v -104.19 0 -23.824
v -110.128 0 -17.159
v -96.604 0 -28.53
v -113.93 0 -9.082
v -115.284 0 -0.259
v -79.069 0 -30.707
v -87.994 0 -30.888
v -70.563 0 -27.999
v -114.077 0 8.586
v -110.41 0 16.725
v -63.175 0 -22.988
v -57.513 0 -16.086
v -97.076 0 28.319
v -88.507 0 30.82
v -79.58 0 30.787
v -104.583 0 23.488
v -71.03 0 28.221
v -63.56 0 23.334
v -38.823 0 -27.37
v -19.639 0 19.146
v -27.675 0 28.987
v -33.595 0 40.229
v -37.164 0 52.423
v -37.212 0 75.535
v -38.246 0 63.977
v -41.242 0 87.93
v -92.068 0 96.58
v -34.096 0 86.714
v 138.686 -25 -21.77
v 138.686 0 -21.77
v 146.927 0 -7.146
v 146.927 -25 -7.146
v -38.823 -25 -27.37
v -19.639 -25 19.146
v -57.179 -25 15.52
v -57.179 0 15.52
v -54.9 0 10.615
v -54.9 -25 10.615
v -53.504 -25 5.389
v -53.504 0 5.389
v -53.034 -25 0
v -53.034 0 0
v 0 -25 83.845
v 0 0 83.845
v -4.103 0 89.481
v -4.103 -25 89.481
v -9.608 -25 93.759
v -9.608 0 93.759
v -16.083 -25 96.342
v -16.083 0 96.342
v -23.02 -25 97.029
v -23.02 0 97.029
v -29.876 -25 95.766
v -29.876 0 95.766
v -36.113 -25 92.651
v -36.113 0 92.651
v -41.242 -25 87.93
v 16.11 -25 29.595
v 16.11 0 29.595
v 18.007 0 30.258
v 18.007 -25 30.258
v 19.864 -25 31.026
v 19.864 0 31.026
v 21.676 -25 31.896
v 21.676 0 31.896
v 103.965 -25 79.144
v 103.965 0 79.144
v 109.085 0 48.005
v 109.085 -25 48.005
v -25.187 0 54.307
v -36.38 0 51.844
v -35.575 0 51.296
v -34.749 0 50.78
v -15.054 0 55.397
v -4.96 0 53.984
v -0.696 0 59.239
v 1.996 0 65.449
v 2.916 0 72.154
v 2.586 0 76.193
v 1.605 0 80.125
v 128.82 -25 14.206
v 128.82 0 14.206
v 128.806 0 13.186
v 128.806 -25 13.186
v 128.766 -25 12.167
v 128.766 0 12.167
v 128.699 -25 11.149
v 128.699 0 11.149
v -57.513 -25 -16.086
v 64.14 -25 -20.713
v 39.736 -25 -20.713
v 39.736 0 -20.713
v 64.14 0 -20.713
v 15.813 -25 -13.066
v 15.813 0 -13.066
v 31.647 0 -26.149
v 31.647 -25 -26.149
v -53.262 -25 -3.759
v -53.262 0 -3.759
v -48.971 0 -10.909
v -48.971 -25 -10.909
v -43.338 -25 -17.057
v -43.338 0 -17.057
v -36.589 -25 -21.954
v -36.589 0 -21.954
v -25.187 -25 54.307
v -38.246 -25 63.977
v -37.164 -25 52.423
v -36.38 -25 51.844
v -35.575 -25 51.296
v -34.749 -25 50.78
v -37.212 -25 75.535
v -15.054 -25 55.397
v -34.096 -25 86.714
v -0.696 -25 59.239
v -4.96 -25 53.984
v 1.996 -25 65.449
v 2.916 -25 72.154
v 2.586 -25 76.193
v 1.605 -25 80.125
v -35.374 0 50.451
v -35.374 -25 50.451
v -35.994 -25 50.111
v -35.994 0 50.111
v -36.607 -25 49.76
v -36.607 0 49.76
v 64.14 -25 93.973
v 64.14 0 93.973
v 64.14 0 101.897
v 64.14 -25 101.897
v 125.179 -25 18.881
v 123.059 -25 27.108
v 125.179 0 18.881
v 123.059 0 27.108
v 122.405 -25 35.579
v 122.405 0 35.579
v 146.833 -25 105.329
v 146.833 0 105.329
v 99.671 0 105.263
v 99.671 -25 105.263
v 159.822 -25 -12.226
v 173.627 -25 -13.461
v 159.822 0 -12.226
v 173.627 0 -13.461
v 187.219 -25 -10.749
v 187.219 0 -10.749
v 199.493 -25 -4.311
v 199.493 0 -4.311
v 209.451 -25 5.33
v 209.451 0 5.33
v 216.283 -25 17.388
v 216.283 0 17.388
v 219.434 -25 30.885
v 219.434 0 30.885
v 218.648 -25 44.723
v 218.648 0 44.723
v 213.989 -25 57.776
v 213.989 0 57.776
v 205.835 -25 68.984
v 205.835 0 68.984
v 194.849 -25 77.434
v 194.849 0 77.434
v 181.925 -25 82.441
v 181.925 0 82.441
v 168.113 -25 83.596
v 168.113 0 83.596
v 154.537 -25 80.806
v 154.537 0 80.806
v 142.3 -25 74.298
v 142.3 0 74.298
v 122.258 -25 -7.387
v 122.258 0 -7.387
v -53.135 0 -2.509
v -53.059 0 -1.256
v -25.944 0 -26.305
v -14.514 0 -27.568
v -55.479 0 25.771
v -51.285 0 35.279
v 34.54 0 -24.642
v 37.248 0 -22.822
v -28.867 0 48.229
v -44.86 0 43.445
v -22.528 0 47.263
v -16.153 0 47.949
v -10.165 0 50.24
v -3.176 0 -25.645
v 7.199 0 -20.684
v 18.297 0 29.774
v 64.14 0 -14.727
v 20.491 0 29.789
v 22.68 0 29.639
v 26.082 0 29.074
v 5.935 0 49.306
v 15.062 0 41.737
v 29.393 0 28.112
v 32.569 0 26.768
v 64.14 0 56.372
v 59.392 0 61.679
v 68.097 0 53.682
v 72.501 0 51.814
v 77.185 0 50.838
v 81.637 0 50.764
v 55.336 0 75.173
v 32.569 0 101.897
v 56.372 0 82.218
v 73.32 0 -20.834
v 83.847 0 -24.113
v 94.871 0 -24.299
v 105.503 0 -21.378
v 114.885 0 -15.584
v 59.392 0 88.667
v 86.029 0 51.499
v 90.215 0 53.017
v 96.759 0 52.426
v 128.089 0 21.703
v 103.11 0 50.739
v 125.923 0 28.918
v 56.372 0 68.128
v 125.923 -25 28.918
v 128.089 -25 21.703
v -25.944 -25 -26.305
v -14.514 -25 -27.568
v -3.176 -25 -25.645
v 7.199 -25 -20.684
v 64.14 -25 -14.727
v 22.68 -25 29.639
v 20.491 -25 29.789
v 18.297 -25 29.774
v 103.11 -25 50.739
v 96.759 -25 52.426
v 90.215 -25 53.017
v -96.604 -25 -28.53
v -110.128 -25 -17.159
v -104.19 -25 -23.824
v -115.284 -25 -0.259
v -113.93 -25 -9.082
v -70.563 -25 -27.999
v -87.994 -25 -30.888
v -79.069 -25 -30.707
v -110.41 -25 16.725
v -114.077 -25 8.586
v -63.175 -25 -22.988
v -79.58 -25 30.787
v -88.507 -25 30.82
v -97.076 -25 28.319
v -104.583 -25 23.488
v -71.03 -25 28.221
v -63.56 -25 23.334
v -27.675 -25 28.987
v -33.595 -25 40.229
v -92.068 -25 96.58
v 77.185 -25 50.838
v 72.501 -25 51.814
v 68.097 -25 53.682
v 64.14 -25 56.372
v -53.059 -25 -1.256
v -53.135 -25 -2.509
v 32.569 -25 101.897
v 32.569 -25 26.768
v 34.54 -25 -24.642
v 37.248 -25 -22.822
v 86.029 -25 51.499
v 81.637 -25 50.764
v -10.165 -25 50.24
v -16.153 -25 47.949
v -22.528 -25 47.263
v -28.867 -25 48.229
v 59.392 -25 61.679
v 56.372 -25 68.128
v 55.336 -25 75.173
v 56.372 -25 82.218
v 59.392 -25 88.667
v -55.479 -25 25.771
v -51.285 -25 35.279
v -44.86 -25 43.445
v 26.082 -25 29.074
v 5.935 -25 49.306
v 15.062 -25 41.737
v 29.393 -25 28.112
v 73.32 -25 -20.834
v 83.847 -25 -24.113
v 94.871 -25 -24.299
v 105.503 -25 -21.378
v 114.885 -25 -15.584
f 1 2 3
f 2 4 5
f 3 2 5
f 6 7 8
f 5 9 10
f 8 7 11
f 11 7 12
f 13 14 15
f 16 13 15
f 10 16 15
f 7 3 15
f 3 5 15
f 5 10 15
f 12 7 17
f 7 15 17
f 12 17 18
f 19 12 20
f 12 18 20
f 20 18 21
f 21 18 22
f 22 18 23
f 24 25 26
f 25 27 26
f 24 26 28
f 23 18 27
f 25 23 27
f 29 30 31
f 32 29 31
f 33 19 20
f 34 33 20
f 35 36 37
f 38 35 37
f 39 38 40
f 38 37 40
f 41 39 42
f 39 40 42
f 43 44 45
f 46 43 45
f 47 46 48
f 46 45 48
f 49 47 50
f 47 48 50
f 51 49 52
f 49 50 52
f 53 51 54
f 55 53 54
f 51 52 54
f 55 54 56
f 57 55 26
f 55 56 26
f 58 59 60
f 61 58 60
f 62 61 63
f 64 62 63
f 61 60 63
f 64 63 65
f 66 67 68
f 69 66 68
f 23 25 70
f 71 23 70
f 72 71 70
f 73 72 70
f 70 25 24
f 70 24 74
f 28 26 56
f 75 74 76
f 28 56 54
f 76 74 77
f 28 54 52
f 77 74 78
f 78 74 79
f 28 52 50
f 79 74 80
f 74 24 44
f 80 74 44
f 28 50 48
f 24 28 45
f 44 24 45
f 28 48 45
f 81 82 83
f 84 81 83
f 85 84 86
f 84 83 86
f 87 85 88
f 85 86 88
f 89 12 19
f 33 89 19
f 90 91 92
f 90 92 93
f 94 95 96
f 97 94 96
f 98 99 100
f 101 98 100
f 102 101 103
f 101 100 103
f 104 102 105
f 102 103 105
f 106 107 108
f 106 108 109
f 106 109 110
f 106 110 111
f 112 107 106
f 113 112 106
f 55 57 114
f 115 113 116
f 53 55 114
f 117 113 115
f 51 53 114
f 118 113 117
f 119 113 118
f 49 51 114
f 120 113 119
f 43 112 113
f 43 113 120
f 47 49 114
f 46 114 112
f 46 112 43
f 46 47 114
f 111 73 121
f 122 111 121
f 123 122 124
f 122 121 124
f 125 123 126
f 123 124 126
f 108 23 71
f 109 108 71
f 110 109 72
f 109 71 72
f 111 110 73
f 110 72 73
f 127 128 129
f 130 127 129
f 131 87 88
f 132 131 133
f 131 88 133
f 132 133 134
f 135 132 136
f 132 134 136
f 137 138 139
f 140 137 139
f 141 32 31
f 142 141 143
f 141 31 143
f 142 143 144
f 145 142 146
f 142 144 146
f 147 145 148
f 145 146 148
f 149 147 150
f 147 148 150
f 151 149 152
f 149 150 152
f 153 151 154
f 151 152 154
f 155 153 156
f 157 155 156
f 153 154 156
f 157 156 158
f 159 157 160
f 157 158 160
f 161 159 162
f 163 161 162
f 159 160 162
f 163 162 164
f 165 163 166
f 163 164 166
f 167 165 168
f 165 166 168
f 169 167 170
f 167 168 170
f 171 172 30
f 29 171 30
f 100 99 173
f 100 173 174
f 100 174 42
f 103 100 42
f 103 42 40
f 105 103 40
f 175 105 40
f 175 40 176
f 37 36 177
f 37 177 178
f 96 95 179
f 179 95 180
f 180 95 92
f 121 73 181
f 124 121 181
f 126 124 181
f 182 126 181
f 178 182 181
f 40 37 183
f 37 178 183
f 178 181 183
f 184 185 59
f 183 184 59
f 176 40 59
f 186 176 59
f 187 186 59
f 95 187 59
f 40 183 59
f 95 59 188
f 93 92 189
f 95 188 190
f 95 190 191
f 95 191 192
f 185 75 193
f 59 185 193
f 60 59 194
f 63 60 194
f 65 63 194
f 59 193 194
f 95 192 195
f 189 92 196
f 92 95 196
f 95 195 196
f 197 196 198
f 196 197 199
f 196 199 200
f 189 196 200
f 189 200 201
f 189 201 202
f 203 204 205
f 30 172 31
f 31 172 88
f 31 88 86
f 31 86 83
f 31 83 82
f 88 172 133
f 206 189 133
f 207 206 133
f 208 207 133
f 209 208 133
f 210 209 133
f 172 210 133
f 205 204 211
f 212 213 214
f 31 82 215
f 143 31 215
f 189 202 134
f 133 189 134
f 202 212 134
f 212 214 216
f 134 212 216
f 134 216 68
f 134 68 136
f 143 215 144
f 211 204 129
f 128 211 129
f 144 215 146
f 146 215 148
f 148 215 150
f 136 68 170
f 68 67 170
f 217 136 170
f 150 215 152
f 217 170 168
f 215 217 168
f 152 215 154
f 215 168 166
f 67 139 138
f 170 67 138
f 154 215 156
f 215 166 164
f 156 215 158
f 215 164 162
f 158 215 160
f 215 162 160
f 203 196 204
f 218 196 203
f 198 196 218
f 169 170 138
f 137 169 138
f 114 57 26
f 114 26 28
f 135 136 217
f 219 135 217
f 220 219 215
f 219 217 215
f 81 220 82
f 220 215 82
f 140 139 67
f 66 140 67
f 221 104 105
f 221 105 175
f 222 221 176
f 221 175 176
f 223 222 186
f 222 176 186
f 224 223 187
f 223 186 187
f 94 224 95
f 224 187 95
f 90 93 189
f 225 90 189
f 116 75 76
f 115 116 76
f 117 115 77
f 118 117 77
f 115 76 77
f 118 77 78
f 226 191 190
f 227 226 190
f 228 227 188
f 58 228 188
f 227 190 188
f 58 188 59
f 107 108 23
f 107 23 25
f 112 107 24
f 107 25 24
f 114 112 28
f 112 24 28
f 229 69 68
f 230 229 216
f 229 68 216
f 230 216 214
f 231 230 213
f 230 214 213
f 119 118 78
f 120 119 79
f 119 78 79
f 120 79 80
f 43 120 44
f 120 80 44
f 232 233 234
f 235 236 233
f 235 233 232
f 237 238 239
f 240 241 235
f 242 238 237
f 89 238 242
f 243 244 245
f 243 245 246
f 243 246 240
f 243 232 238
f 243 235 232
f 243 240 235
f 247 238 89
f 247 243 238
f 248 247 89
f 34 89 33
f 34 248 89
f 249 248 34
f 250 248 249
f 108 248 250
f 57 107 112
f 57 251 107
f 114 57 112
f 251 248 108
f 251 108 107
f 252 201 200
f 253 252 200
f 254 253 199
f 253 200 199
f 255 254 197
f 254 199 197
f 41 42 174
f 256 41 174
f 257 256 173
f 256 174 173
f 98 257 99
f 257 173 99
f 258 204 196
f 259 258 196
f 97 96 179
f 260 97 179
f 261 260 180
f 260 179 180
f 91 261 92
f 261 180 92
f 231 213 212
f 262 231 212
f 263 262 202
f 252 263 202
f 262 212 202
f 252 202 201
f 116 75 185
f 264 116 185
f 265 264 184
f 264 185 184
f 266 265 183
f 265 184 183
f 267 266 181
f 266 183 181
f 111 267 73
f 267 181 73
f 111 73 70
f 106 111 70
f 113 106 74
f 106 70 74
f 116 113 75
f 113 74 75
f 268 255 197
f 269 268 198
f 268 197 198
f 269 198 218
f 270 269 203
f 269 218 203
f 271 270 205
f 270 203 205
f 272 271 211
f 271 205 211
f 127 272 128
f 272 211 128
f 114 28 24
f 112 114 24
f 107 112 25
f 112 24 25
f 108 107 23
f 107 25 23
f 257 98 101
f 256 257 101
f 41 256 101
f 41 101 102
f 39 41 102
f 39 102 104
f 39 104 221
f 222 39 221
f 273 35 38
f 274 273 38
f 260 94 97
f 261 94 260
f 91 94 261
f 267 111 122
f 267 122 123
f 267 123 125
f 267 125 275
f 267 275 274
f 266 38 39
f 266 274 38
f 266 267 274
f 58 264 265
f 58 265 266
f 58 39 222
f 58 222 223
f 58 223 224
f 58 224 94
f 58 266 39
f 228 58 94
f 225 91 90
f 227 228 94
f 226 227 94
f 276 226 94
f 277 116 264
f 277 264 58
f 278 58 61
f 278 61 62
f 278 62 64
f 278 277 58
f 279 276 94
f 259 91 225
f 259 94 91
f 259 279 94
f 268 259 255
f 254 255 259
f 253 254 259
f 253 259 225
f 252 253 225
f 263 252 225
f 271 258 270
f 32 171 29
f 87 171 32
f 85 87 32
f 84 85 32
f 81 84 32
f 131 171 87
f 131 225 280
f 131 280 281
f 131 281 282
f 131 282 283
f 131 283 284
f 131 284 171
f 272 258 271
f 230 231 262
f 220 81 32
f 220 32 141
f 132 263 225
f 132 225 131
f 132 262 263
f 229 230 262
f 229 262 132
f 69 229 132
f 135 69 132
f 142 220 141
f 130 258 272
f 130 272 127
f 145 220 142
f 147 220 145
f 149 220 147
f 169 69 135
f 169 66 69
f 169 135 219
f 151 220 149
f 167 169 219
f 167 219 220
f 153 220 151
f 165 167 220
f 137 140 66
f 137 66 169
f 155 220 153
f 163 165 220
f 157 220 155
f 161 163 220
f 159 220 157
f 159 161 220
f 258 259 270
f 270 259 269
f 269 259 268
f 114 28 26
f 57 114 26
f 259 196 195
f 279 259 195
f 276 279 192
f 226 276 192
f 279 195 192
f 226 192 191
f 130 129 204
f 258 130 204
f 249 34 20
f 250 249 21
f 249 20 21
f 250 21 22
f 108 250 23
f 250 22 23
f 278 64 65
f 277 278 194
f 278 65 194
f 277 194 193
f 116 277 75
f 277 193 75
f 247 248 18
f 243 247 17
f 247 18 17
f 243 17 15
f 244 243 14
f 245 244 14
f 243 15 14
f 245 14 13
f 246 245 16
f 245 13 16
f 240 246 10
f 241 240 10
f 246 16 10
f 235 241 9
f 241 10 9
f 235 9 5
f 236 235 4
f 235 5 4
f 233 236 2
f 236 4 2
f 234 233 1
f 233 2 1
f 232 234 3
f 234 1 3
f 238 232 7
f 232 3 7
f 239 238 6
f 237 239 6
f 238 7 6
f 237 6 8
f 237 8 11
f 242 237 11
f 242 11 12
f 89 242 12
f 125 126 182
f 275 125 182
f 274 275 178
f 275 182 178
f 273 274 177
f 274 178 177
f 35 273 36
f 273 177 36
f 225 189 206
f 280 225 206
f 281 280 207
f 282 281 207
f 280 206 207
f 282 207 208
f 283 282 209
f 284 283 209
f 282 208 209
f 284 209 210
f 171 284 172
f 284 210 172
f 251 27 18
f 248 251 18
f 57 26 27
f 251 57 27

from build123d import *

# Parameters (mm, degrees)
F3_DEPTH = 25


with BuildPart() as f3:
    # F0 (on Front) → F3 (new body)
    with BuildSketch(Plane.XZ):
        with BuildLine():
            ThreePointArc((-57.5129599565, -16.0864628453), (-54.1744360224, -8.3492191036), (-53.0337243425, 0))
            ThreePointArc((-53.0337243425, 0), (-55.7869818002, 12.7989524029), (-63.5596679574, 23.3336075535))
            ThreePointArc((-63.5596679574, 23.3336075535), (-114.9250954512, -4.7192103171), (-57.5129599565, -16.0864628453))
        make_face()
        with BuildLine():
            ThreePointArc((-63.5596679574, 23.3336075535), (-55.7869818002, 12.7989524029), (-53.0337243425, 0))
            ThreePointArc((-53.0337243425, 0), (-54.1744360224, -8.3492191036), (-57.5129599565, -16.0864628453))
            Line((-57.5129599565, -16.0864628453), (-38.822568953, -27.3698866367))
            Line((-38.822568953, -27.3698866367), (-19.6386948228, 19.145950675))
            ThreePointArc((-19.6386948228, 19.145950675), (-30.9162562326, 34.4599627539), (-37.1640258454, 52.4229171927))
            ThreePointArc((-37.1640258454, 52.4229171927), (-46.7150991932, 69.3136234913), (-41.2417085605, 87.9297712223))
            Line((-41.2417085605, 87.9297712223), (-92.067733407, 96.5796262026))
            Line((-92.067733407, 96.5796262026), (-63.5596679574, 23.3336075535))
        make_face()
        with BuildLine():
            Line((-34.0956747532, 86.7136195302), (-41.2417085605, 87.9297712223))
            ThreePointArc((-41.2417085605, 87.9297712223), (-46.7150991932, 69.3136234913), (-37.1640258454, 52.4229171927))
            ThreePointArc((-37.1640258454, 52.4229171927), (-37.9931792296, 69.7797403469), (-34.0956747532, 86.7136195302))
        make_face()
    extrude(amount=F3_DEPTH)


with BuildPart() as f3b:
    # F1 (on face) → F3, piece 2 (new body)
    with BuildSketch(Plane.XZ):
        with BuildLine():
            ThreePointArc((22.6798846139, 29.6390745967), (19.3937151758, 29.8020017295), (16.1100178957, 29.5951515436))
            ThreePointArc((16.1100178957, 29.5951515436), (18.9410054417, 30.6292208692), (21.67584417, 31.895888539))
            ThreePointArc((21.67584417, 31.895888539), (10.7700522114, 45.849059237), (-4.9604636005, 53.9840542009))
            ThreePointArc((-4.9604636005, 53.9840542009), (-19.3186695983, 47.400145928), (-34.7485039853, 50.7804030796))
            ThreePointArc((-34.7485039853, 50.7804030796), (-35.6844274432, 50.2820713922), (-36.6073121526, 49.7599880627))
            ThreePointArc((-36.6073121526, 49.7599880627), (-30.2695427886, 33.2631947723), (-19.6386948228, 19.145950675))
            Line((-19.6386948228, 19.145950675), (-36.5888869277, -21.9537965919))
            ThreePointArc((-36.5888869277, -21.9537965919), (-8.7780666366, -27.0012589518), (15.8131210591, -13.0659767785))
            ThreePointArc((15.8131210591, -13.0659767785), (23.2066061979, -0.4695140568), (25.7772746795, 13.9084607363))
            ThreePointArc((25.7772746795, 13.9084607363), (24.9955637813, 21.9247884124), (22.6798846139, 29.6390745967))
        make_face()
        with BuildLine():
            ThreePointArc((32.5686484575, 26.7681818786), (27.7514826988, 28.6418231537), (22.6798846139, 29.6390745967))
            ThreePointArc((22.6798846139, 29.6390745967), (24.9955637813, 21.9247884124), (25.7772746795, 13.9084607363))
            ThreePointArc((25.7772746795, 13.9084607363), (23.2066061979, -0.4695140568), (15.8131210591, -13.0659767785))
            Line((15.8131210591, -13.0659767785), (31.6467881203, -26.148930192))
            ThreePointArc((31.6467881203, -26.148930192), (35.919117176, -23.7697035307), (39.7357987823, -20.712506026))
            Line((39.7357987823, -20.712506026), (32.5686484575, -20.712506026))
            Line((32.5686484575, -20.712506026), (32.5686484575, 26.7681818786))
        make_face()
        with BuildLine():
            Line((32.5686484575, 87.4569258152), (32.5686484575, 40.5099101671))
            ThreePointArc((32.5686484575, 40.5099101671), (41.2449777291, 63.9834179912), (32.5686484575, 87.4569258152))
        make_face()
        with BuildLine():
            ThreePointArc((32.5686484575, 87.4569258152), (41.2449777291, 63.9834179912), (32.5686484575, 40.5099101671))
            Line((32.5686484575, 40.5099101671), (32.5686484575, 26.7681818786))
            ThreePointArc((32.5686484575, 26.7681818786), (48.5364514198, 4.8972215897), (39.7357987823, -20.712506026))
            Line((39.7357987823, -20.712506026), (64.1396269202, -20.712506026))
            Line((64.1396269202, -20.712506026), (64.1396269202, -14.7266603521))
            ThreePointArc((64.1396269202, -14.7266603521), (51.1973866521, 14.2060667276), (64.1396269202, 43.1387938073))
            Line((64.1396269202, 43.1387938073), (64.1396269202, 56.3723585854))
            ThreePointArc((64.1396269202, 56.3723585854), (55.3361792801, 75.172799182), (64.1396269202, 93.9732397787))
            Line((64.1396269202, 93.9732397787), (64.1396269202, 101.8965914845))
            Line((64.1396269202, 101.8965914845), (32.5686484575, 101.8965914845))
            Line((32.5686484575, 101.8965914845), (32.5686484575, 87.4569258152))
        make_face()
        with BuildLine():
            ThreePointArc((39.7357987823, -20.712506026), (48.5364514198, 4.8972215897), (32.5686484575, 26.7681818786))
            Line((32.5686484575, 26.7681818786), (32.5686484575, -20.712506026))
            Line((32.5686484575, -20.712506026), (39.7357987823, -20.712506026))
        make_face()
        with BuildLine():
            ThreePointArc((-19.6386948228, 19.145950675), (-30.2695427886, 33.2631947723), (-36.6073121526, 49.7599880627))
            ThreePointArc((-36.6073121526, 49.7599880627), (-51.2845084466, 35.2785480536), (-57.1793476261, 15.5204341043))
            ThreePointArc((-57.1793476261, 15.5204341043), (-54.0879846732, 8.0322796764), (-53.0337243425, 0))
            ThreePointArc((-53.0337243425, 0), (-53.0907279184, -1.8828946308), (-53.261529853, -3.7588925779))
            ThreePointArc((-53.261529853, -3.7588925779), (-46.3091923785, -14.1245387359), (-36.5888869277, -21.9537965919))
            Line((-36.5888869277, -21.9537965919), (-19.6386948228, 19.145950675))
        make_face()
        with BuildLine():
            ThreePointArc((64.1396269202, 43.1387938073), (51.1973866521, 14.2060667276), (64.1396269202, -14.7266603521))
            Line((64.1396269202, -14.7266603521), (64.1396269202, 43.1387938073))
        make_face()
        with BuildLine():
            Line((64.1396269202, 43.1387938073), (64.1396269202, -14.7266603521))
            ThreePointArc((64.1396269202, -14.7266603521), (94.8714157265, -24.299133232), (122.2583204617, -7.3866369852))
            ThreePointArc((122.2583204617, -7.3866369852), (126.6693657888, 1.4672962095), (128.6989113378, 11.1487423185))
            ThreePointArc((128.6989113378, 11.1487423185), (123.9392055501, 22.9482151463), (122.4046294826, 35.578632182))
            ThreePointArc((122.4046294826, 35.578632182), (116.4841739619, 42.5844918046), (109.084925085, 48.0052831383))
            ThreePointArc((109.084925085, 48.0052831383), (99.9702550376, 51.7168828456), (90.2150532091, 53.0165827137))
            ThreePointArc((90.2150532091, 53.0165827137), (83.8500329286, 51.0314326127), (77.1854449114, 50.8376010994))
            ThreePointArc((77.1854449114, 50.8376010994), (70.2832808433, 47.6308544859), (64.1396269202, 43.1387938073))
        make_face()
        with BuildLine():
            Line((64.1396269202, 56.3723585854), (64.1396269202, 43.1387938073))
            ThreePointArc((64.1396269202, 43.1387938073), (70.2832808433, 47.6308544859), (77.1854449114, 50.8376010994))
            ThreePointArc((77.1854449114, 50.8376010994), (70.2532121523, 52.6401745495), (64.1396269202, 56.3723585854))
        make_face()
        with BuildLine():
            ThreePointArc((128.6989113378, 11.1487423185), (126.6693657888, 1.4672962095), (122.2583204617, -7.3866369852))
            Line((122.2583204617, -7.3866369852), (138.6857926846, -21.7697098851))
            Line((138.6857926846, -21.7697098851), (146.9266724857, -7.1460989624))
            ThreePointArc((146.9266724857, -7.1460989624), (136.5755240921, 0.7685904427), (128.6989113378, 11.1487423185))
        make_face()
        with BuildLine():
            Line((99.6706486582, 105.2629665375), (103.96512909, 79.1439118403))
            Line((103.96512909, 79.1439118403), (109.084925085, 48.0052831383))
            ThreePointArc((109.084925085, 48.0052831383), (116.4841739619, 42.5844918046), (122.4046294826, 35.578632182))
            ThreePointArc((122.4046294826, 35.578632182), (127.775402975, 57.2901740208), (142.2999815172, 74.2981978653))
            Line((142.2999815172, 74.2981978653), (146.8326449394, 105.3287759423))
            Line((146.8326449394, 105.3287759423), (99.6706486582, 105.2629665375))
        make_face()
        with BuildLine():
            ThreePointArc((128.8195184172, 14.2060667276), (128.789354926, 12.6762155412), (128.6989113378, 11.1487423185))
            ThreePointArc((128.6989113378, 11.1487423185), (136.5755240921, 0.7685904427), (146.9266724857, -7.1460989624))
            ThreePointArc((146.9266724857, -7.1460989624), (195.4224488753, -6.9551665697), (219.6153865573, 35.0755192339))
            ThreePointArc((219.6153865573, 35.0755192339), (192.9993129943, 78.4232134504), (142.2999815172, 74.2981978653))
            ThreePointArc((142.2999815172, 74.2981978653), (127.775402975, 57.2901740208), (122.4046294826, 35.578632182))
            ThreePointArc((122.4046294826, 35.578632182), (127.1812180547, 25.3633217008), (128.8195184172, 14.2060667276))
        make_face()
    extrude(amount=F3_DEPTH)


with BuildPart() as f3c:
    # F1 (on face) → F3, piece 3 (new body)
    with BuildSketch(Plane.XZ):
        with BuildLine():
            ThreePointArc((-34.7485039853, 50.7804030796), (-20.1537146111, 55.1645227662), (-4.9604636005, 53.9840542009))
            ThreePointArc((-4.9604636005, 53.9840542009), (0.8620484172, 62.252275739), (2.9158330555, 72.1541494131))
            ThreePointArc((2.9158330555, 72.1541494131), (2.1758787307, 78.1788806293), (0, 83.8454907605))
            ThreePointArc((0, 83.8454907605), (-19.5273271661, 96.9297048561), (-41.2417085605, 87.9297712223))
            Line((-41.2417085605, 87.9297712223), (-34.0956747532, 86.7136195302))
            ThreePointArc((-34.0956747532, 86.7136195302), (-37.9931792296, 69.7797403469), (-37.1640258454, 52.4229171927))
            ThreePointArc((-37.1640258454, 52.4229171927), (-35.9803745824, 51.5662038637), (-34.7485039853, 50.7804030796))
        make_face()
    extrude(amount=F3_DEPTH)


solid = Compound([f3.part, f3b.part, f3c.part])
